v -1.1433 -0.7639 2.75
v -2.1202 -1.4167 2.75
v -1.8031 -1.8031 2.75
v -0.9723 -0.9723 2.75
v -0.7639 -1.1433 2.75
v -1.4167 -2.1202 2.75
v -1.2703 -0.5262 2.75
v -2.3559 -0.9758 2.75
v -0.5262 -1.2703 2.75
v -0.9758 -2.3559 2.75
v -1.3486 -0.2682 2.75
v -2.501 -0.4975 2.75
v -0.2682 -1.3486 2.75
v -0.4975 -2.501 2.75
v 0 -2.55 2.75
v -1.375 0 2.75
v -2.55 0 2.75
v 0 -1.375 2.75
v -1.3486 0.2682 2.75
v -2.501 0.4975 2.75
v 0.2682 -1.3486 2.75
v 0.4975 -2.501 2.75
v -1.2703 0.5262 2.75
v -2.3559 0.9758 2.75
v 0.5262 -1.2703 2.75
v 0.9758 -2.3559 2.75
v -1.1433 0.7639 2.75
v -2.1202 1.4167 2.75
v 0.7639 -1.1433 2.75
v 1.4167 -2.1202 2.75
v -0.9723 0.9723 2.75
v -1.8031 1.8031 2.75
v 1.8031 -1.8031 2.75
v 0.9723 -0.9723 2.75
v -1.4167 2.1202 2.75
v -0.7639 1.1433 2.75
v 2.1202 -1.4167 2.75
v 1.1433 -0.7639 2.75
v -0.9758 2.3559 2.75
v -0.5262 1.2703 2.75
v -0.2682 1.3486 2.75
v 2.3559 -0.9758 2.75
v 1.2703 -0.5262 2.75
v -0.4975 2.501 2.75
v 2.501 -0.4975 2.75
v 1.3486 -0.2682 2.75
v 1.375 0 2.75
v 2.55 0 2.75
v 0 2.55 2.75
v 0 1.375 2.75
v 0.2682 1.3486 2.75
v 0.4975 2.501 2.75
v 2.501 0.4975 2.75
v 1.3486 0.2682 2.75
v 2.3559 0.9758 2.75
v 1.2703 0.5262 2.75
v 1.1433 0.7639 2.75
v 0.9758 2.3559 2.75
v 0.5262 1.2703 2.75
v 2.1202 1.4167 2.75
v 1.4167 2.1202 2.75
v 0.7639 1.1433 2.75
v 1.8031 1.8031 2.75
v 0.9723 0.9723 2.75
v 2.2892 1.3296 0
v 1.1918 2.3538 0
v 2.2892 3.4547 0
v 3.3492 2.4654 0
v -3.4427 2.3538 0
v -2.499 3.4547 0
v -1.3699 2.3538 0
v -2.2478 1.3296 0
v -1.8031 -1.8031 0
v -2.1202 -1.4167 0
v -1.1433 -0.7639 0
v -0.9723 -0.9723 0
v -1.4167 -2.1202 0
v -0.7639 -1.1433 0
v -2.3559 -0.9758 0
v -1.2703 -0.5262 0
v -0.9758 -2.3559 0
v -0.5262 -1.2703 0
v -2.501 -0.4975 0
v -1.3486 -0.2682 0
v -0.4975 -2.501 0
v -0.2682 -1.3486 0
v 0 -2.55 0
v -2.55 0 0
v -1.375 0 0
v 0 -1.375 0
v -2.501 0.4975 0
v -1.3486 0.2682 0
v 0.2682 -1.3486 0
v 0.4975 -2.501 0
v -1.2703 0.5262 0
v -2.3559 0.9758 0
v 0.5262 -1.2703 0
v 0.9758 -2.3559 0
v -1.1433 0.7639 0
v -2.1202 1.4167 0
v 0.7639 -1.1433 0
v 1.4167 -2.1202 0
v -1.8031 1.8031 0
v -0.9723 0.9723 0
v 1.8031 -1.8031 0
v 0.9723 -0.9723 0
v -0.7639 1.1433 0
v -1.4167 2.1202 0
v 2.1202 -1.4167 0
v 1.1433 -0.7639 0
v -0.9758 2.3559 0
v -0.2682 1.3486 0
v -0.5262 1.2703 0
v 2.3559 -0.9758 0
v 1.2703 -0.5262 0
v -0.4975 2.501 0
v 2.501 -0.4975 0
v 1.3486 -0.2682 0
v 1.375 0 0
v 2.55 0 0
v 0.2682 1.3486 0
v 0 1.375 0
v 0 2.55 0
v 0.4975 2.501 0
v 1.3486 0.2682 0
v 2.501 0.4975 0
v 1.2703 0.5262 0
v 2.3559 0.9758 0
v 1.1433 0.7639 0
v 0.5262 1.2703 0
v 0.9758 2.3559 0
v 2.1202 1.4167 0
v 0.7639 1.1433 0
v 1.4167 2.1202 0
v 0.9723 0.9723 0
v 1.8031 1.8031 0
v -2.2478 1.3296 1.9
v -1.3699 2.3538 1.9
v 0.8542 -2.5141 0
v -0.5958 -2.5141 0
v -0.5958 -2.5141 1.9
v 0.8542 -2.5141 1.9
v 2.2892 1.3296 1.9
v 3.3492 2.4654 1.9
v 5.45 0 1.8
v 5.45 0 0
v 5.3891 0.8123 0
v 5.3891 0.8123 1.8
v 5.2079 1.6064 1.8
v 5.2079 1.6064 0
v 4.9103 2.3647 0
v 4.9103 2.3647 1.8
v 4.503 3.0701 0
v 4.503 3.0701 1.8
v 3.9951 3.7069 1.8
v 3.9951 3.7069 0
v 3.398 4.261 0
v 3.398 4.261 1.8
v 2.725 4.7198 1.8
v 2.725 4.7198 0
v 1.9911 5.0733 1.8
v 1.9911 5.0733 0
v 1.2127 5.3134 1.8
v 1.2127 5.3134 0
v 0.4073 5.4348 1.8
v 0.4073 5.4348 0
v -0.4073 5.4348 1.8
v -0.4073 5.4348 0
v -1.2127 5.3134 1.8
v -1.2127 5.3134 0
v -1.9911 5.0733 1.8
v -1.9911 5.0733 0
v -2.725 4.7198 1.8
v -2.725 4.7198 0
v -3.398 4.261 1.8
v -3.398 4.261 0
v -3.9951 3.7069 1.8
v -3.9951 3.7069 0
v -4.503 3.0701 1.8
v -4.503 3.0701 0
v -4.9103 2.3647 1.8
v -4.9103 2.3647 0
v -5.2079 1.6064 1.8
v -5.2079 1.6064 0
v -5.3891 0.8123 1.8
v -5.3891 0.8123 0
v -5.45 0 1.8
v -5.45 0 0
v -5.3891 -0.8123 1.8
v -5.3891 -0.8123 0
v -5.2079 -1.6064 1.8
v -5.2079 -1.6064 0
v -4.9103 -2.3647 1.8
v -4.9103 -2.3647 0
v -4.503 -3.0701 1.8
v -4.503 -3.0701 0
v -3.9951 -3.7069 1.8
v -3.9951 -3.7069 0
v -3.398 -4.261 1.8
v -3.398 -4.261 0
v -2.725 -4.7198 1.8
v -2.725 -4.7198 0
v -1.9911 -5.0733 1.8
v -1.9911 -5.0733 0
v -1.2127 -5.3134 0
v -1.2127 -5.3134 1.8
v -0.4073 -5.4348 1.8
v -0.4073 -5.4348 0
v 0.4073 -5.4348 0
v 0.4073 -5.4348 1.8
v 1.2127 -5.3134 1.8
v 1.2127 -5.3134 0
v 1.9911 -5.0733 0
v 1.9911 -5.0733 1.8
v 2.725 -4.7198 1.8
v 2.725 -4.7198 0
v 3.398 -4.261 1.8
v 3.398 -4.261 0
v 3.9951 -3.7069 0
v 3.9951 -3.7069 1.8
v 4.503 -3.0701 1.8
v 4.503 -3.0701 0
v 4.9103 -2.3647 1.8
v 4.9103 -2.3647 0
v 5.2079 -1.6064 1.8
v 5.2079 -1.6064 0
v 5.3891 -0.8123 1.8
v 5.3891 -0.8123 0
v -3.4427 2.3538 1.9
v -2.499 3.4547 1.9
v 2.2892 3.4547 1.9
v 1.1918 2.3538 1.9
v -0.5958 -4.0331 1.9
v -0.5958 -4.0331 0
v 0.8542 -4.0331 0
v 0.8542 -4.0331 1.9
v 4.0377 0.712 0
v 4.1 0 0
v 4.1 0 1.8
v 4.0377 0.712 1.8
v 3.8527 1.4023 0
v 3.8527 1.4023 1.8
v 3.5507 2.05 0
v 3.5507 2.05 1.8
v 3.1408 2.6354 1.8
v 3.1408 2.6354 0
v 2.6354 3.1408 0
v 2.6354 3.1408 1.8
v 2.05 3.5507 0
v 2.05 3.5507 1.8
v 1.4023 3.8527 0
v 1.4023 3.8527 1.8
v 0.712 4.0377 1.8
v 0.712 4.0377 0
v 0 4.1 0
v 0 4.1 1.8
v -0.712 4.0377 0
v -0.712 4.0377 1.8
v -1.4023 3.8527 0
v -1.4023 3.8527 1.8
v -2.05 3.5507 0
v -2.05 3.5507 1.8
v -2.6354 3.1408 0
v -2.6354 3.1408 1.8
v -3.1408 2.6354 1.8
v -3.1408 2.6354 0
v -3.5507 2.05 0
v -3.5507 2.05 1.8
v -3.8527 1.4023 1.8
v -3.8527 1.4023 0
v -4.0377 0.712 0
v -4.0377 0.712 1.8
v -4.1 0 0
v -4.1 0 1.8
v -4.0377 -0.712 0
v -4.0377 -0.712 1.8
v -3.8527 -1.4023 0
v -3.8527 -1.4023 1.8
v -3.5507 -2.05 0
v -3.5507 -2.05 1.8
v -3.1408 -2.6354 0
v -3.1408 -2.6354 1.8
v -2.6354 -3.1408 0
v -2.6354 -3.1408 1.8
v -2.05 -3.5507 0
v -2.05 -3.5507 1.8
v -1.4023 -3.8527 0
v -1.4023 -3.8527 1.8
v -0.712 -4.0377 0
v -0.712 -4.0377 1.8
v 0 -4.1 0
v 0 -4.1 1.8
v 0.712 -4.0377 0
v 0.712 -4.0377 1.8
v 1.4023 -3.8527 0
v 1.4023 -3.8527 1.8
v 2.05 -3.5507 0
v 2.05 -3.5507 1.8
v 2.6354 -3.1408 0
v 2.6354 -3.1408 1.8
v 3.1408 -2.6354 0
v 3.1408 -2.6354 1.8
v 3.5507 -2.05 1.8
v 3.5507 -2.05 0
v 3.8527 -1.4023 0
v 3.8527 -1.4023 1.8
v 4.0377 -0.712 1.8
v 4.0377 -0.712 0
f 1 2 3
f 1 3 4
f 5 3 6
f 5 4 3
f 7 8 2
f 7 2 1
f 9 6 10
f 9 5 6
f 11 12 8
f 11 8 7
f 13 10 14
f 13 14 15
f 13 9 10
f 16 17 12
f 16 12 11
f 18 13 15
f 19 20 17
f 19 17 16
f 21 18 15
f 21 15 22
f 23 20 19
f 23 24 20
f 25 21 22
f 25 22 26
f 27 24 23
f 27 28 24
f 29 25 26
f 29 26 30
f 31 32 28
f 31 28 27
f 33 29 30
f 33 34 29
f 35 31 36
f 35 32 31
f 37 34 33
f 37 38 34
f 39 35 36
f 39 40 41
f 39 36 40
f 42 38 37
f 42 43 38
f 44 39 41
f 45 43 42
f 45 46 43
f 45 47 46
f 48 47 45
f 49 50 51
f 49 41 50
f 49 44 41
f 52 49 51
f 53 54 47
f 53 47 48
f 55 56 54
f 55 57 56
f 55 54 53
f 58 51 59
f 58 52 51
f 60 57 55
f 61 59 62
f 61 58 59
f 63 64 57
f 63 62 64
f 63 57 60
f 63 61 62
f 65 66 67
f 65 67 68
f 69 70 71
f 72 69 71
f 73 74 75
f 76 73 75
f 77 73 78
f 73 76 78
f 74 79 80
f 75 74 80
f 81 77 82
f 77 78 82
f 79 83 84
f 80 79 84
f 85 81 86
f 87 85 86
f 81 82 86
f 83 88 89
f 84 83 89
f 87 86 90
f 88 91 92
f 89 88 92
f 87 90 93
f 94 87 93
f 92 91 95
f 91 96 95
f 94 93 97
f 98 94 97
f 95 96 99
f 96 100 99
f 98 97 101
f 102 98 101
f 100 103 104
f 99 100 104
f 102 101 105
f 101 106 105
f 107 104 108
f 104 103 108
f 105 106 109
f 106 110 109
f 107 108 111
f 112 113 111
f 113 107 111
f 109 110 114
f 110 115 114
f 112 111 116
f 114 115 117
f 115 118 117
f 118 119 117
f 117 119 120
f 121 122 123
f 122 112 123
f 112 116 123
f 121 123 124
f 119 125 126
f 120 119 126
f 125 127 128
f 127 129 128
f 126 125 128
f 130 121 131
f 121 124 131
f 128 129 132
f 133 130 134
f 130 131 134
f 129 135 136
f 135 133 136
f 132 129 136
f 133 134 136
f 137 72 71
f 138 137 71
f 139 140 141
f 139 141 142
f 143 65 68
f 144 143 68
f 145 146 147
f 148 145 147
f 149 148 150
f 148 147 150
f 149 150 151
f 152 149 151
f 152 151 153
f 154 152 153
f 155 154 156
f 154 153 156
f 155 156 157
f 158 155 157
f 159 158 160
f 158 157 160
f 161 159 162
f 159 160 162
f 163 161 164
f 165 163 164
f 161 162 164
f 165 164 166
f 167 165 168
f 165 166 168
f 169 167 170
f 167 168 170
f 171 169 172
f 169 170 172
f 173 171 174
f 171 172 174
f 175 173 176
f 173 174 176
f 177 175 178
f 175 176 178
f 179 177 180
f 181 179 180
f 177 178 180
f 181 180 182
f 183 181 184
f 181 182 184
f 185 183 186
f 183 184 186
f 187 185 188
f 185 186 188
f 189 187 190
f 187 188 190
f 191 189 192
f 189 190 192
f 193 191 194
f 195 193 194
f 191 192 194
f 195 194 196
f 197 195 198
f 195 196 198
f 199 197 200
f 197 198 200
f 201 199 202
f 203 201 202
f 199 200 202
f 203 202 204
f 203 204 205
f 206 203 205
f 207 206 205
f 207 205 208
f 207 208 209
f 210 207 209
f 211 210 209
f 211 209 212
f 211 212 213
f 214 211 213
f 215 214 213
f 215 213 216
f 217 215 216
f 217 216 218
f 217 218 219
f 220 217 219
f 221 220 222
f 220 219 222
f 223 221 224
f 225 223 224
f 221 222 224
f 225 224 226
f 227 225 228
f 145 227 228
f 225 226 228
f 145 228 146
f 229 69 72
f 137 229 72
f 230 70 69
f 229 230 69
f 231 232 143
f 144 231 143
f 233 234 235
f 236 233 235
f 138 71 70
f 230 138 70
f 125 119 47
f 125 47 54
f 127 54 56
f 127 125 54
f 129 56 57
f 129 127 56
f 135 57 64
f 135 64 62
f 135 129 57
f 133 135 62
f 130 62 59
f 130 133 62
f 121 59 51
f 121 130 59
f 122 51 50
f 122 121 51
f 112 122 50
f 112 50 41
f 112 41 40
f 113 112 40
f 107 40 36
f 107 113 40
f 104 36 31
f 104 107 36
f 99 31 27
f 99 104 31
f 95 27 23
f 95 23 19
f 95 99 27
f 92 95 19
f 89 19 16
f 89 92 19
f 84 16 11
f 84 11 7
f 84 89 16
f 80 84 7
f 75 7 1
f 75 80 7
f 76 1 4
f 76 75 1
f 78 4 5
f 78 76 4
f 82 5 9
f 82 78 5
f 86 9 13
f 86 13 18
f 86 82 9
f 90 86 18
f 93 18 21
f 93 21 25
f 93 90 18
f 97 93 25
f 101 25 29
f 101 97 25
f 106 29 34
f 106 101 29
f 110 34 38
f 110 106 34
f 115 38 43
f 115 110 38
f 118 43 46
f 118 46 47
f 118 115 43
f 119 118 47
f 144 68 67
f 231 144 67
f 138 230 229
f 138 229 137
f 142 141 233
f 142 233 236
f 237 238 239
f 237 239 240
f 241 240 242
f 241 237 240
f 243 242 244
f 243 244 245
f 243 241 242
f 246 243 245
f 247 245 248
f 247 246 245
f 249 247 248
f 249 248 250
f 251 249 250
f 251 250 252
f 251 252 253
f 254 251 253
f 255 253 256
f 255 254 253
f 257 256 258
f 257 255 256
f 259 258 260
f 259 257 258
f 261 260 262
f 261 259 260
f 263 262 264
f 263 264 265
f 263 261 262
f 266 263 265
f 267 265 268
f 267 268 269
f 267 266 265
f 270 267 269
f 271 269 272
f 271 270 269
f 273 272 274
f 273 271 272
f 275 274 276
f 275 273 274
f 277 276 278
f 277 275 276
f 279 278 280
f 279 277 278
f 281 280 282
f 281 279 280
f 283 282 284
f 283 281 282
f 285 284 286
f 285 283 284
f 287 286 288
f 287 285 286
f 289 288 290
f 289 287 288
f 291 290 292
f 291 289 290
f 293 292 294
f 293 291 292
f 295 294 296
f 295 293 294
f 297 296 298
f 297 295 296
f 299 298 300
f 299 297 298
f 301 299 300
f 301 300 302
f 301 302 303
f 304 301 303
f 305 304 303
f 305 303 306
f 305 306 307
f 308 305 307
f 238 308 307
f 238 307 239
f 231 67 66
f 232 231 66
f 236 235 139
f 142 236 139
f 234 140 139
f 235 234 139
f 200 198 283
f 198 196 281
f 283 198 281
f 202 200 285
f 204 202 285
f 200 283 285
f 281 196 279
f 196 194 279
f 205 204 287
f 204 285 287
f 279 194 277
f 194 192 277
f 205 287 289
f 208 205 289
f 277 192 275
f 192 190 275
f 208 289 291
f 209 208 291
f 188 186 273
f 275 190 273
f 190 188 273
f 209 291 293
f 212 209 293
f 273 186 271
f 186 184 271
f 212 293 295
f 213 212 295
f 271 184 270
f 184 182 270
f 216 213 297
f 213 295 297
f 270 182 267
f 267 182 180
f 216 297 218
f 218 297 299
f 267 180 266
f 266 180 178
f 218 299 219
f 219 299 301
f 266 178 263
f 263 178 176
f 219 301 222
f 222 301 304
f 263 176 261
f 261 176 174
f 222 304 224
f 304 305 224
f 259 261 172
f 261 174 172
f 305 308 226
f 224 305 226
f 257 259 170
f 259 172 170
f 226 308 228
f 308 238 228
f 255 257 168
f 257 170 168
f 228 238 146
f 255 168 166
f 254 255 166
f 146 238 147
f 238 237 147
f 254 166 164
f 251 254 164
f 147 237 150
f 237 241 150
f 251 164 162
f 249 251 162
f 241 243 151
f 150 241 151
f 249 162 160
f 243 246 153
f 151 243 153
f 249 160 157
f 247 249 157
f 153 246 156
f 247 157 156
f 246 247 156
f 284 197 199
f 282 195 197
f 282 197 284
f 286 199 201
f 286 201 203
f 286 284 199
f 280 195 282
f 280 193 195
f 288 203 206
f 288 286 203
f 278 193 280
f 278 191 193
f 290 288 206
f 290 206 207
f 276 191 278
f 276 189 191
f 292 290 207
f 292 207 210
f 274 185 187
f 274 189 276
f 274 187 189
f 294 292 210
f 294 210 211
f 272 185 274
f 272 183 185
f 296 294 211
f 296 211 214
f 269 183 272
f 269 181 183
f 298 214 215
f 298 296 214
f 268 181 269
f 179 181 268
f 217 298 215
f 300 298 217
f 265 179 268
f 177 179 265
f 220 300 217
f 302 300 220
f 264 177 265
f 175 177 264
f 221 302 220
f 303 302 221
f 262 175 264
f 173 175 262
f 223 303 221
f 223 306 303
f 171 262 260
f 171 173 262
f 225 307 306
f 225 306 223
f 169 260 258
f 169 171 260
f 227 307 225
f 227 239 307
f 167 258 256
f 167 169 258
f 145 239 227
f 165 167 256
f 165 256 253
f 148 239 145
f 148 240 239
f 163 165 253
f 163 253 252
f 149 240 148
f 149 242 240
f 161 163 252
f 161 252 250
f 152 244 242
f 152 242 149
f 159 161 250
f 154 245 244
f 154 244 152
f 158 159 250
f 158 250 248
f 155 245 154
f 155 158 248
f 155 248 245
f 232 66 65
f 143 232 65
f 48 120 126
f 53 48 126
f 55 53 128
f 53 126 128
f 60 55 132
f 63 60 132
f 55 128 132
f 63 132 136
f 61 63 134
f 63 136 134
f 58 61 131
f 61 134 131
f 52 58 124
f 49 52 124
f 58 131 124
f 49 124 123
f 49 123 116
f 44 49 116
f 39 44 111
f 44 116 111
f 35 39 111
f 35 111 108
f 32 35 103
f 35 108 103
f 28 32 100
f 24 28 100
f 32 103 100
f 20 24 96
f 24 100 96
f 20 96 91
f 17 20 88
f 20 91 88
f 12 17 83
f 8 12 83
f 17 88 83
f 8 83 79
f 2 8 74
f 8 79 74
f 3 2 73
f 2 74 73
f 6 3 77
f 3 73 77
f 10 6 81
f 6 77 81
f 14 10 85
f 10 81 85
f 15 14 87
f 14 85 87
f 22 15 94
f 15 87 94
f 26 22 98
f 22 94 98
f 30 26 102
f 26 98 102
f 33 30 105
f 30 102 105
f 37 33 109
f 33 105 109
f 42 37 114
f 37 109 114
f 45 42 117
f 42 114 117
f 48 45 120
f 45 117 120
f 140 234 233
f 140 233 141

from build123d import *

# Parameters (mm, degrees)
F0_R     = 2.55
F0_R_2   = 1.375
F1_DEPTH = 2.75
F2_R     = 5.45
F2_R_2   = 4.1
F3_DEPTH = 1.8
F4_W     = 1.45
F4_H     = 1.519047
F5_DEPTH = 1.9


with BuildPart() as f1:
    # F0 (on Top) → F1 (new body)
    with BuildSketch(Plane.XY):
        Circle(F0_R)
        Circle(F0_R_2, mode=Mode.SUBTRACT)
    extrude(amount=F1_DEPTH)


with BuildPart() as f3:
    # F2 (on Top) → F3 (new body)
    with BuildSketch(Plane.XY):
        Circle(F2_R)
        Circle(F2_R_2, mode=Mode.SUBTRACT)
    extrude(amount=F3_DEPTH)


with BuildPart() as f5:
    # F4 (on Top) → F5 (new body)
    with BuildSketch(Plane.XY):
        with Locations((0.129204, -3.273578)):
            Rectangle(F4_W, F4_H)
        Polygon((2.289163, 3.454722), (1.191822, 2.3538), (2.289163, 1.329614), (3.349193, 2.46536), align=None)
        Polygon((-2.247792, 1.329614), (-1.369919, 2.3538), (-2.499028, 3.454722), (-3.442676, 2.3538), align=None)
    extrude(amount=F5_DEPTH)


solid = Compound([f1.part, f3.part, f5.part])
